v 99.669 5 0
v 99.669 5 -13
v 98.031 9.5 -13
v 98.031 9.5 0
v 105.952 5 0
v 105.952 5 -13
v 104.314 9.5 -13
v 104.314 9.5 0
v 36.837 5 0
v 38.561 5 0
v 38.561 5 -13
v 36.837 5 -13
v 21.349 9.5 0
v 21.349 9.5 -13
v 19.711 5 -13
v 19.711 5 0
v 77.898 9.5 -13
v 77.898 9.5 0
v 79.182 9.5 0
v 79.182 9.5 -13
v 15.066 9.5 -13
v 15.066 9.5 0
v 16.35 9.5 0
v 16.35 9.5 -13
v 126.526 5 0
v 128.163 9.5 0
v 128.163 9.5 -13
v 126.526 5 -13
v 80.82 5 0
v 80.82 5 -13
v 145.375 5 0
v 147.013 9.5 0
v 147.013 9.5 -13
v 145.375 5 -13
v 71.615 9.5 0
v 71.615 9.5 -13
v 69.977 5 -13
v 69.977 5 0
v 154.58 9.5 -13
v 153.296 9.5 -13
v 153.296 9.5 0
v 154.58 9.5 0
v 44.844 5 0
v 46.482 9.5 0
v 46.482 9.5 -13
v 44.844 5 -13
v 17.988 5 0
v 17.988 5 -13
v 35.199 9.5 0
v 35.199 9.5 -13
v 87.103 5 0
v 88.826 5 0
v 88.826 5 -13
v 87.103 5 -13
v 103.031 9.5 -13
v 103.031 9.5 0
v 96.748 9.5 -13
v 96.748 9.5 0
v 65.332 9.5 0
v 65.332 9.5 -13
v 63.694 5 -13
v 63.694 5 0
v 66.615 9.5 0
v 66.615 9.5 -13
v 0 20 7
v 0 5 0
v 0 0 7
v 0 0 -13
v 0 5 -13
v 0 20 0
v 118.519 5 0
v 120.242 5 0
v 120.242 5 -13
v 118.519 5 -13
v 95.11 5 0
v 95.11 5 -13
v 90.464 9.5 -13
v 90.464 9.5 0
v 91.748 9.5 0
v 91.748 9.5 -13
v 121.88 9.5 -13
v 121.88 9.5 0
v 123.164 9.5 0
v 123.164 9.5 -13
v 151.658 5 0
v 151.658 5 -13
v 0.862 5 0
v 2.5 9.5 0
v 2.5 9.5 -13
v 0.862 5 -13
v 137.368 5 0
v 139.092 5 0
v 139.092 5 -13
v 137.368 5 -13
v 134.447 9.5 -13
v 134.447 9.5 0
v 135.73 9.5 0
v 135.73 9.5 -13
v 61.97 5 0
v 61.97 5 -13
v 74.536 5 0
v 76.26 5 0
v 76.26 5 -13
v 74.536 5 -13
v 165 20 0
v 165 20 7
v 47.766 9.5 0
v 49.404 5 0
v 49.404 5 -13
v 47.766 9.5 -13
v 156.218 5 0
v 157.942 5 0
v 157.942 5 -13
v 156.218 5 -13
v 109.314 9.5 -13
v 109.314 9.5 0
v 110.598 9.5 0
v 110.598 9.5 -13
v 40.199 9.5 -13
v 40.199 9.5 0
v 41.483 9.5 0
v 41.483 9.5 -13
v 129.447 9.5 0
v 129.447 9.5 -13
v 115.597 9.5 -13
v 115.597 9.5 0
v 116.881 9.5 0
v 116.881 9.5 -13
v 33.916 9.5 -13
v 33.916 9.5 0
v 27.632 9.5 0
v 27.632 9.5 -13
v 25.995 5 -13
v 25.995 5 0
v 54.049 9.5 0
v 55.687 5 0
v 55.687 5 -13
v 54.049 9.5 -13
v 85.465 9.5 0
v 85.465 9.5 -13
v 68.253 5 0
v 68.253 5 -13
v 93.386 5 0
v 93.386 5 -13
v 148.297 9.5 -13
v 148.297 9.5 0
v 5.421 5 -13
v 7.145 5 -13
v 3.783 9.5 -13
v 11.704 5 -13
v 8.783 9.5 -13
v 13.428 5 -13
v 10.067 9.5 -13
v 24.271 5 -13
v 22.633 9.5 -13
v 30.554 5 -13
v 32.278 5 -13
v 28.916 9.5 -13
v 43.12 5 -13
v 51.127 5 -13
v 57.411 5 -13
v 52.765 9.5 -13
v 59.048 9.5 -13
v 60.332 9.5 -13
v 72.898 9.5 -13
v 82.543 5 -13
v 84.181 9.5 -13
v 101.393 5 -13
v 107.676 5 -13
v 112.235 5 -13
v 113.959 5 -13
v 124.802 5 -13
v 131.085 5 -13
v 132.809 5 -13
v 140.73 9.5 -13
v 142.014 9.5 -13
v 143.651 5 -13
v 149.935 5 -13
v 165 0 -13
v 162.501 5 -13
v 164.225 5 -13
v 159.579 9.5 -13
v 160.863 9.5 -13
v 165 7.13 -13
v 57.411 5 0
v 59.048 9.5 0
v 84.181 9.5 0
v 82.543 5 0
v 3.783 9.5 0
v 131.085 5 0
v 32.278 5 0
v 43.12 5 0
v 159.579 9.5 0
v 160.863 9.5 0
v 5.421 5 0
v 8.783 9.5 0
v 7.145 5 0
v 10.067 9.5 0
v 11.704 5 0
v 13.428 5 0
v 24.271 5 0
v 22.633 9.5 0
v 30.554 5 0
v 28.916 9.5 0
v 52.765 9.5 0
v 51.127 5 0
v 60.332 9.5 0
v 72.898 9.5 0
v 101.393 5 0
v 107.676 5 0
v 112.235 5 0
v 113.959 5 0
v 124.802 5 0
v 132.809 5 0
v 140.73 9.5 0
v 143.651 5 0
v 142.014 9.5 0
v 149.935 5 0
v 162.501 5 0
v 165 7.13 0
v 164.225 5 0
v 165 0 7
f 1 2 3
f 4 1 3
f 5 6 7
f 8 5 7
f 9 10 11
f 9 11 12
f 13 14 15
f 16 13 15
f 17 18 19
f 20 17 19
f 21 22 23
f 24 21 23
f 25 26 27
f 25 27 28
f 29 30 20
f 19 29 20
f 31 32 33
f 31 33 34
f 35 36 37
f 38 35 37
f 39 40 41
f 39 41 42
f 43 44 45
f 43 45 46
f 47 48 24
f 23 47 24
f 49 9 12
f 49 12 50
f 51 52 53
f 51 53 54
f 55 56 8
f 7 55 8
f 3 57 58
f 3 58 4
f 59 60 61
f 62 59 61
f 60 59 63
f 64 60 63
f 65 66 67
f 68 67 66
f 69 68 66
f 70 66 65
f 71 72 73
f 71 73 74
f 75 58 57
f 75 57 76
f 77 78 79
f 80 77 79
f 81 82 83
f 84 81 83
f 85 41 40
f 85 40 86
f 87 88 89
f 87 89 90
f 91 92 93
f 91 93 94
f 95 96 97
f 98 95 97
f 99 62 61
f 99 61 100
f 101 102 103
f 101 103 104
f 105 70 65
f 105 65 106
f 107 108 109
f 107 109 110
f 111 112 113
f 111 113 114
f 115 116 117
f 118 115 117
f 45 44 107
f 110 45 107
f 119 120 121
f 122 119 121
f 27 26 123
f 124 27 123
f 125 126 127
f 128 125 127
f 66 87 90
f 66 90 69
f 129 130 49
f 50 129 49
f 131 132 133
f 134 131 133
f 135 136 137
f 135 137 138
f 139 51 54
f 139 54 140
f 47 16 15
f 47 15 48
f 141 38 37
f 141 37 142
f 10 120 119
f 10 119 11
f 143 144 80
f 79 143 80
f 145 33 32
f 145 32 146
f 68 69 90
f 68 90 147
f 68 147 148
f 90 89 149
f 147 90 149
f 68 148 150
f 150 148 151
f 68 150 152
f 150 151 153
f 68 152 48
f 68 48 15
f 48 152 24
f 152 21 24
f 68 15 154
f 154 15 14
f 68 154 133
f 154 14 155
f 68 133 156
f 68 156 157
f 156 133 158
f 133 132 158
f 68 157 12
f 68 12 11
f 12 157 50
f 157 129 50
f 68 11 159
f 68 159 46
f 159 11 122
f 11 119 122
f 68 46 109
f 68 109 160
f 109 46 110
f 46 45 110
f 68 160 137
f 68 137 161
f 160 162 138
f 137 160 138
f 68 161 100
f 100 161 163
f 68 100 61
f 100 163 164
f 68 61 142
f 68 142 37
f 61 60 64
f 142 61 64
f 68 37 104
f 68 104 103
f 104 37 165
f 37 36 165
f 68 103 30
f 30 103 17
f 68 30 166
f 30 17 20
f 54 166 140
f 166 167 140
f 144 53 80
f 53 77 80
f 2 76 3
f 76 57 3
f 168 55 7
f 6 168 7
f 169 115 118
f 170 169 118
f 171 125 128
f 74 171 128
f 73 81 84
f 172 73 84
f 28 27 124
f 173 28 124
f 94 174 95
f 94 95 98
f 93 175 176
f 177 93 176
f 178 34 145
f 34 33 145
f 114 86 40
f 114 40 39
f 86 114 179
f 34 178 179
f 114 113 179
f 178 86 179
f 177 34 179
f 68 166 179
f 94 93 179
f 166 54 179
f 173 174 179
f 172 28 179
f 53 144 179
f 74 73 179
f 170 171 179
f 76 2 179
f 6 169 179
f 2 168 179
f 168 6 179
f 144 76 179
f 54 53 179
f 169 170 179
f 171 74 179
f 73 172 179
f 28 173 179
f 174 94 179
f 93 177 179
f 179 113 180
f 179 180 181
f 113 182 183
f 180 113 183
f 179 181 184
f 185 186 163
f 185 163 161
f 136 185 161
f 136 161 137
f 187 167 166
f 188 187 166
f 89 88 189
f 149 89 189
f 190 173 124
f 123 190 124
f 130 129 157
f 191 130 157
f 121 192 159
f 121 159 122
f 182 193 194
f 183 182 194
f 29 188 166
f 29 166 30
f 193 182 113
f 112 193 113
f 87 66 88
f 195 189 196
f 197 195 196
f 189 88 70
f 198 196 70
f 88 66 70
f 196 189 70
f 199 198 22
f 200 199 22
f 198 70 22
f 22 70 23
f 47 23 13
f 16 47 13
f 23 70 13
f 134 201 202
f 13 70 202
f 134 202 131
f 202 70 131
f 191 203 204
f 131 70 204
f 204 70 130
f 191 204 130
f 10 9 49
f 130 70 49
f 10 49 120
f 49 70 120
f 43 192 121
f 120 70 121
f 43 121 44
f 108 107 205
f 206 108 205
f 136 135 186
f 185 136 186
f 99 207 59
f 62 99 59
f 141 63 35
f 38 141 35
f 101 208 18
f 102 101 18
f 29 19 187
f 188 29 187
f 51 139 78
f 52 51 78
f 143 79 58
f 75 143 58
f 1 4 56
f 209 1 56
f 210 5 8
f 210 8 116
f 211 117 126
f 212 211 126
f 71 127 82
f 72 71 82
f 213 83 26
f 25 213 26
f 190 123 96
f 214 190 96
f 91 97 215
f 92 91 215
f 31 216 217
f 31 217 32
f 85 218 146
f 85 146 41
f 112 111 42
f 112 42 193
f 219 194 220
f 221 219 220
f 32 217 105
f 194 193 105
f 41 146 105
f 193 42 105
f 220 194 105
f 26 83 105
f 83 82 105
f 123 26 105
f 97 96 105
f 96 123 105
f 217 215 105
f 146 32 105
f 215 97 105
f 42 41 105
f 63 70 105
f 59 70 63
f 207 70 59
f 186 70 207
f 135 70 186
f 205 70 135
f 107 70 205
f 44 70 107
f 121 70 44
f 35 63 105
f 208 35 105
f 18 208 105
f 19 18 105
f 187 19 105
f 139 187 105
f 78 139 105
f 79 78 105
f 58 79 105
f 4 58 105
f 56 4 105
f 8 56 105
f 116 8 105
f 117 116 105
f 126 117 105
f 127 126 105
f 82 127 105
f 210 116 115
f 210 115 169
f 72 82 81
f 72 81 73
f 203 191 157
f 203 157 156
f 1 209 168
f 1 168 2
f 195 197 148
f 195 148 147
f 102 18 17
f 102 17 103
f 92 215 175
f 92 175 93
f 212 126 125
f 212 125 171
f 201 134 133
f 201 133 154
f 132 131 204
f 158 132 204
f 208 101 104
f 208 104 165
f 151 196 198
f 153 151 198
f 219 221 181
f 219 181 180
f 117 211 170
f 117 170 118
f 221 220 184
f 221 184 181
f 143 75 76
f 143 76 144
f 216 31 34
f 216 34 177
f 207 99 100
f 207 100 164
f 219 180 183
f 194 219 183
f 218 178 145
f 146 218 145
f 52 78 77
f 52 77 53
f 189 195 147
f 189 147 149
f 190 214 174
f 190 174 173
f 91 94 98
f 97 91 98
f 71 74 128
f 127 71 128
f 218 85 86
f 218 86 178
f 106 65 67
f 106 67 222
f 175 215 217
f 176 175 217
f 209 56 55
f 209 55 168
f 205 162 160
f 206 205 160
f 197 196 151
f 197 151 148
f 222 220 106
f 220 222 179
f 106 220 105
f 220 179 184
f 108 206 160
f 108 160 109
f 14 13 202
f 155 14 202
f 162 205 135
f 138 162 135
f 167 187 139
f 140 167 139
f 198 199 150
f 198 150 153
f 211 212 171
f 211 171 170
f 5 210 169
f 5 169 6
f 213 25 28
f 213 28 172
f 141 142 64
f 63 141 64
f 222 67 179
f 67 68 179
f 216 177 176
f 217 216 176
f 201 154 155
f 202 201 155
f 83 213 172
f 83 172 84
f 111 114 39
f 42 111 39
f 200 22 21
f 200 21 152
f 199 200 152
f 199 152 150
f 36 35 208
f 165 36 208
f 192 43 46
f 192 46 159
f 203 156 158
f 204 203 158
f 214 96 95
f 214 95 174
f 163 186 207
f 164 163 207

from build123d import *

# Parameters (mm, degrees)
BLANKSKE_W         = 165
BLANKSKE_H         = 9.5
BLANK_DEPTH        = 13
TOOTHCUTSIM_DEPTH  = 166.78374468
TEETHCUTS_COUNT    = 27
TEETHCUTS_PITCH    = 6.2831853
ESQUISSE1_W        = 165
ESQUISSE1_H        = 20
BOSS_EXTRU_1_DEPTH = 7


with BuildPart() as part:
    # BlankSke → Blank (new body)
    with BuildSketch(Plane.XY):
        with Locations((82.5, 4.75)):
            Rectangle(BLANKSKE_W, BLANKSKE_H)
    extrude(amount=-BLANK_DEPTH)

    # TooCutSkeSim → ToothCutSim (cut, through all)
    with BuildSketch(Plane.XY):
        Polygon((0.861870739, 5), (-0.861870739, 5), (-2.508981637, 9.5254), (2.508981637, 9.5254), align=None)
    toothcutsim = extrude(amount=-TOOTHCUTSIM_DEPTH, mode=Mode.SUBTRACT)

    # TeethCuts: ToothCutSim ×27
    with Locations(*[(i * TEETHCUTS_PITCH, 0, 0) for i in range(1, TEETHCUTS_COUNT)]):
        add(toothcutsim, mode=Mode.SUBTRACT)

    # Esquisse1 → Boss.-Extru.1 (add)
    with BuildSketch(Plane.XY):
        with Locations((82.5, 10)):
            Rectangle(ESQUISSE1_W, ESQUISSE1_H)
    extrude(amount=BOSS_EXTRU_1_DEPTH)


solid = part.part
